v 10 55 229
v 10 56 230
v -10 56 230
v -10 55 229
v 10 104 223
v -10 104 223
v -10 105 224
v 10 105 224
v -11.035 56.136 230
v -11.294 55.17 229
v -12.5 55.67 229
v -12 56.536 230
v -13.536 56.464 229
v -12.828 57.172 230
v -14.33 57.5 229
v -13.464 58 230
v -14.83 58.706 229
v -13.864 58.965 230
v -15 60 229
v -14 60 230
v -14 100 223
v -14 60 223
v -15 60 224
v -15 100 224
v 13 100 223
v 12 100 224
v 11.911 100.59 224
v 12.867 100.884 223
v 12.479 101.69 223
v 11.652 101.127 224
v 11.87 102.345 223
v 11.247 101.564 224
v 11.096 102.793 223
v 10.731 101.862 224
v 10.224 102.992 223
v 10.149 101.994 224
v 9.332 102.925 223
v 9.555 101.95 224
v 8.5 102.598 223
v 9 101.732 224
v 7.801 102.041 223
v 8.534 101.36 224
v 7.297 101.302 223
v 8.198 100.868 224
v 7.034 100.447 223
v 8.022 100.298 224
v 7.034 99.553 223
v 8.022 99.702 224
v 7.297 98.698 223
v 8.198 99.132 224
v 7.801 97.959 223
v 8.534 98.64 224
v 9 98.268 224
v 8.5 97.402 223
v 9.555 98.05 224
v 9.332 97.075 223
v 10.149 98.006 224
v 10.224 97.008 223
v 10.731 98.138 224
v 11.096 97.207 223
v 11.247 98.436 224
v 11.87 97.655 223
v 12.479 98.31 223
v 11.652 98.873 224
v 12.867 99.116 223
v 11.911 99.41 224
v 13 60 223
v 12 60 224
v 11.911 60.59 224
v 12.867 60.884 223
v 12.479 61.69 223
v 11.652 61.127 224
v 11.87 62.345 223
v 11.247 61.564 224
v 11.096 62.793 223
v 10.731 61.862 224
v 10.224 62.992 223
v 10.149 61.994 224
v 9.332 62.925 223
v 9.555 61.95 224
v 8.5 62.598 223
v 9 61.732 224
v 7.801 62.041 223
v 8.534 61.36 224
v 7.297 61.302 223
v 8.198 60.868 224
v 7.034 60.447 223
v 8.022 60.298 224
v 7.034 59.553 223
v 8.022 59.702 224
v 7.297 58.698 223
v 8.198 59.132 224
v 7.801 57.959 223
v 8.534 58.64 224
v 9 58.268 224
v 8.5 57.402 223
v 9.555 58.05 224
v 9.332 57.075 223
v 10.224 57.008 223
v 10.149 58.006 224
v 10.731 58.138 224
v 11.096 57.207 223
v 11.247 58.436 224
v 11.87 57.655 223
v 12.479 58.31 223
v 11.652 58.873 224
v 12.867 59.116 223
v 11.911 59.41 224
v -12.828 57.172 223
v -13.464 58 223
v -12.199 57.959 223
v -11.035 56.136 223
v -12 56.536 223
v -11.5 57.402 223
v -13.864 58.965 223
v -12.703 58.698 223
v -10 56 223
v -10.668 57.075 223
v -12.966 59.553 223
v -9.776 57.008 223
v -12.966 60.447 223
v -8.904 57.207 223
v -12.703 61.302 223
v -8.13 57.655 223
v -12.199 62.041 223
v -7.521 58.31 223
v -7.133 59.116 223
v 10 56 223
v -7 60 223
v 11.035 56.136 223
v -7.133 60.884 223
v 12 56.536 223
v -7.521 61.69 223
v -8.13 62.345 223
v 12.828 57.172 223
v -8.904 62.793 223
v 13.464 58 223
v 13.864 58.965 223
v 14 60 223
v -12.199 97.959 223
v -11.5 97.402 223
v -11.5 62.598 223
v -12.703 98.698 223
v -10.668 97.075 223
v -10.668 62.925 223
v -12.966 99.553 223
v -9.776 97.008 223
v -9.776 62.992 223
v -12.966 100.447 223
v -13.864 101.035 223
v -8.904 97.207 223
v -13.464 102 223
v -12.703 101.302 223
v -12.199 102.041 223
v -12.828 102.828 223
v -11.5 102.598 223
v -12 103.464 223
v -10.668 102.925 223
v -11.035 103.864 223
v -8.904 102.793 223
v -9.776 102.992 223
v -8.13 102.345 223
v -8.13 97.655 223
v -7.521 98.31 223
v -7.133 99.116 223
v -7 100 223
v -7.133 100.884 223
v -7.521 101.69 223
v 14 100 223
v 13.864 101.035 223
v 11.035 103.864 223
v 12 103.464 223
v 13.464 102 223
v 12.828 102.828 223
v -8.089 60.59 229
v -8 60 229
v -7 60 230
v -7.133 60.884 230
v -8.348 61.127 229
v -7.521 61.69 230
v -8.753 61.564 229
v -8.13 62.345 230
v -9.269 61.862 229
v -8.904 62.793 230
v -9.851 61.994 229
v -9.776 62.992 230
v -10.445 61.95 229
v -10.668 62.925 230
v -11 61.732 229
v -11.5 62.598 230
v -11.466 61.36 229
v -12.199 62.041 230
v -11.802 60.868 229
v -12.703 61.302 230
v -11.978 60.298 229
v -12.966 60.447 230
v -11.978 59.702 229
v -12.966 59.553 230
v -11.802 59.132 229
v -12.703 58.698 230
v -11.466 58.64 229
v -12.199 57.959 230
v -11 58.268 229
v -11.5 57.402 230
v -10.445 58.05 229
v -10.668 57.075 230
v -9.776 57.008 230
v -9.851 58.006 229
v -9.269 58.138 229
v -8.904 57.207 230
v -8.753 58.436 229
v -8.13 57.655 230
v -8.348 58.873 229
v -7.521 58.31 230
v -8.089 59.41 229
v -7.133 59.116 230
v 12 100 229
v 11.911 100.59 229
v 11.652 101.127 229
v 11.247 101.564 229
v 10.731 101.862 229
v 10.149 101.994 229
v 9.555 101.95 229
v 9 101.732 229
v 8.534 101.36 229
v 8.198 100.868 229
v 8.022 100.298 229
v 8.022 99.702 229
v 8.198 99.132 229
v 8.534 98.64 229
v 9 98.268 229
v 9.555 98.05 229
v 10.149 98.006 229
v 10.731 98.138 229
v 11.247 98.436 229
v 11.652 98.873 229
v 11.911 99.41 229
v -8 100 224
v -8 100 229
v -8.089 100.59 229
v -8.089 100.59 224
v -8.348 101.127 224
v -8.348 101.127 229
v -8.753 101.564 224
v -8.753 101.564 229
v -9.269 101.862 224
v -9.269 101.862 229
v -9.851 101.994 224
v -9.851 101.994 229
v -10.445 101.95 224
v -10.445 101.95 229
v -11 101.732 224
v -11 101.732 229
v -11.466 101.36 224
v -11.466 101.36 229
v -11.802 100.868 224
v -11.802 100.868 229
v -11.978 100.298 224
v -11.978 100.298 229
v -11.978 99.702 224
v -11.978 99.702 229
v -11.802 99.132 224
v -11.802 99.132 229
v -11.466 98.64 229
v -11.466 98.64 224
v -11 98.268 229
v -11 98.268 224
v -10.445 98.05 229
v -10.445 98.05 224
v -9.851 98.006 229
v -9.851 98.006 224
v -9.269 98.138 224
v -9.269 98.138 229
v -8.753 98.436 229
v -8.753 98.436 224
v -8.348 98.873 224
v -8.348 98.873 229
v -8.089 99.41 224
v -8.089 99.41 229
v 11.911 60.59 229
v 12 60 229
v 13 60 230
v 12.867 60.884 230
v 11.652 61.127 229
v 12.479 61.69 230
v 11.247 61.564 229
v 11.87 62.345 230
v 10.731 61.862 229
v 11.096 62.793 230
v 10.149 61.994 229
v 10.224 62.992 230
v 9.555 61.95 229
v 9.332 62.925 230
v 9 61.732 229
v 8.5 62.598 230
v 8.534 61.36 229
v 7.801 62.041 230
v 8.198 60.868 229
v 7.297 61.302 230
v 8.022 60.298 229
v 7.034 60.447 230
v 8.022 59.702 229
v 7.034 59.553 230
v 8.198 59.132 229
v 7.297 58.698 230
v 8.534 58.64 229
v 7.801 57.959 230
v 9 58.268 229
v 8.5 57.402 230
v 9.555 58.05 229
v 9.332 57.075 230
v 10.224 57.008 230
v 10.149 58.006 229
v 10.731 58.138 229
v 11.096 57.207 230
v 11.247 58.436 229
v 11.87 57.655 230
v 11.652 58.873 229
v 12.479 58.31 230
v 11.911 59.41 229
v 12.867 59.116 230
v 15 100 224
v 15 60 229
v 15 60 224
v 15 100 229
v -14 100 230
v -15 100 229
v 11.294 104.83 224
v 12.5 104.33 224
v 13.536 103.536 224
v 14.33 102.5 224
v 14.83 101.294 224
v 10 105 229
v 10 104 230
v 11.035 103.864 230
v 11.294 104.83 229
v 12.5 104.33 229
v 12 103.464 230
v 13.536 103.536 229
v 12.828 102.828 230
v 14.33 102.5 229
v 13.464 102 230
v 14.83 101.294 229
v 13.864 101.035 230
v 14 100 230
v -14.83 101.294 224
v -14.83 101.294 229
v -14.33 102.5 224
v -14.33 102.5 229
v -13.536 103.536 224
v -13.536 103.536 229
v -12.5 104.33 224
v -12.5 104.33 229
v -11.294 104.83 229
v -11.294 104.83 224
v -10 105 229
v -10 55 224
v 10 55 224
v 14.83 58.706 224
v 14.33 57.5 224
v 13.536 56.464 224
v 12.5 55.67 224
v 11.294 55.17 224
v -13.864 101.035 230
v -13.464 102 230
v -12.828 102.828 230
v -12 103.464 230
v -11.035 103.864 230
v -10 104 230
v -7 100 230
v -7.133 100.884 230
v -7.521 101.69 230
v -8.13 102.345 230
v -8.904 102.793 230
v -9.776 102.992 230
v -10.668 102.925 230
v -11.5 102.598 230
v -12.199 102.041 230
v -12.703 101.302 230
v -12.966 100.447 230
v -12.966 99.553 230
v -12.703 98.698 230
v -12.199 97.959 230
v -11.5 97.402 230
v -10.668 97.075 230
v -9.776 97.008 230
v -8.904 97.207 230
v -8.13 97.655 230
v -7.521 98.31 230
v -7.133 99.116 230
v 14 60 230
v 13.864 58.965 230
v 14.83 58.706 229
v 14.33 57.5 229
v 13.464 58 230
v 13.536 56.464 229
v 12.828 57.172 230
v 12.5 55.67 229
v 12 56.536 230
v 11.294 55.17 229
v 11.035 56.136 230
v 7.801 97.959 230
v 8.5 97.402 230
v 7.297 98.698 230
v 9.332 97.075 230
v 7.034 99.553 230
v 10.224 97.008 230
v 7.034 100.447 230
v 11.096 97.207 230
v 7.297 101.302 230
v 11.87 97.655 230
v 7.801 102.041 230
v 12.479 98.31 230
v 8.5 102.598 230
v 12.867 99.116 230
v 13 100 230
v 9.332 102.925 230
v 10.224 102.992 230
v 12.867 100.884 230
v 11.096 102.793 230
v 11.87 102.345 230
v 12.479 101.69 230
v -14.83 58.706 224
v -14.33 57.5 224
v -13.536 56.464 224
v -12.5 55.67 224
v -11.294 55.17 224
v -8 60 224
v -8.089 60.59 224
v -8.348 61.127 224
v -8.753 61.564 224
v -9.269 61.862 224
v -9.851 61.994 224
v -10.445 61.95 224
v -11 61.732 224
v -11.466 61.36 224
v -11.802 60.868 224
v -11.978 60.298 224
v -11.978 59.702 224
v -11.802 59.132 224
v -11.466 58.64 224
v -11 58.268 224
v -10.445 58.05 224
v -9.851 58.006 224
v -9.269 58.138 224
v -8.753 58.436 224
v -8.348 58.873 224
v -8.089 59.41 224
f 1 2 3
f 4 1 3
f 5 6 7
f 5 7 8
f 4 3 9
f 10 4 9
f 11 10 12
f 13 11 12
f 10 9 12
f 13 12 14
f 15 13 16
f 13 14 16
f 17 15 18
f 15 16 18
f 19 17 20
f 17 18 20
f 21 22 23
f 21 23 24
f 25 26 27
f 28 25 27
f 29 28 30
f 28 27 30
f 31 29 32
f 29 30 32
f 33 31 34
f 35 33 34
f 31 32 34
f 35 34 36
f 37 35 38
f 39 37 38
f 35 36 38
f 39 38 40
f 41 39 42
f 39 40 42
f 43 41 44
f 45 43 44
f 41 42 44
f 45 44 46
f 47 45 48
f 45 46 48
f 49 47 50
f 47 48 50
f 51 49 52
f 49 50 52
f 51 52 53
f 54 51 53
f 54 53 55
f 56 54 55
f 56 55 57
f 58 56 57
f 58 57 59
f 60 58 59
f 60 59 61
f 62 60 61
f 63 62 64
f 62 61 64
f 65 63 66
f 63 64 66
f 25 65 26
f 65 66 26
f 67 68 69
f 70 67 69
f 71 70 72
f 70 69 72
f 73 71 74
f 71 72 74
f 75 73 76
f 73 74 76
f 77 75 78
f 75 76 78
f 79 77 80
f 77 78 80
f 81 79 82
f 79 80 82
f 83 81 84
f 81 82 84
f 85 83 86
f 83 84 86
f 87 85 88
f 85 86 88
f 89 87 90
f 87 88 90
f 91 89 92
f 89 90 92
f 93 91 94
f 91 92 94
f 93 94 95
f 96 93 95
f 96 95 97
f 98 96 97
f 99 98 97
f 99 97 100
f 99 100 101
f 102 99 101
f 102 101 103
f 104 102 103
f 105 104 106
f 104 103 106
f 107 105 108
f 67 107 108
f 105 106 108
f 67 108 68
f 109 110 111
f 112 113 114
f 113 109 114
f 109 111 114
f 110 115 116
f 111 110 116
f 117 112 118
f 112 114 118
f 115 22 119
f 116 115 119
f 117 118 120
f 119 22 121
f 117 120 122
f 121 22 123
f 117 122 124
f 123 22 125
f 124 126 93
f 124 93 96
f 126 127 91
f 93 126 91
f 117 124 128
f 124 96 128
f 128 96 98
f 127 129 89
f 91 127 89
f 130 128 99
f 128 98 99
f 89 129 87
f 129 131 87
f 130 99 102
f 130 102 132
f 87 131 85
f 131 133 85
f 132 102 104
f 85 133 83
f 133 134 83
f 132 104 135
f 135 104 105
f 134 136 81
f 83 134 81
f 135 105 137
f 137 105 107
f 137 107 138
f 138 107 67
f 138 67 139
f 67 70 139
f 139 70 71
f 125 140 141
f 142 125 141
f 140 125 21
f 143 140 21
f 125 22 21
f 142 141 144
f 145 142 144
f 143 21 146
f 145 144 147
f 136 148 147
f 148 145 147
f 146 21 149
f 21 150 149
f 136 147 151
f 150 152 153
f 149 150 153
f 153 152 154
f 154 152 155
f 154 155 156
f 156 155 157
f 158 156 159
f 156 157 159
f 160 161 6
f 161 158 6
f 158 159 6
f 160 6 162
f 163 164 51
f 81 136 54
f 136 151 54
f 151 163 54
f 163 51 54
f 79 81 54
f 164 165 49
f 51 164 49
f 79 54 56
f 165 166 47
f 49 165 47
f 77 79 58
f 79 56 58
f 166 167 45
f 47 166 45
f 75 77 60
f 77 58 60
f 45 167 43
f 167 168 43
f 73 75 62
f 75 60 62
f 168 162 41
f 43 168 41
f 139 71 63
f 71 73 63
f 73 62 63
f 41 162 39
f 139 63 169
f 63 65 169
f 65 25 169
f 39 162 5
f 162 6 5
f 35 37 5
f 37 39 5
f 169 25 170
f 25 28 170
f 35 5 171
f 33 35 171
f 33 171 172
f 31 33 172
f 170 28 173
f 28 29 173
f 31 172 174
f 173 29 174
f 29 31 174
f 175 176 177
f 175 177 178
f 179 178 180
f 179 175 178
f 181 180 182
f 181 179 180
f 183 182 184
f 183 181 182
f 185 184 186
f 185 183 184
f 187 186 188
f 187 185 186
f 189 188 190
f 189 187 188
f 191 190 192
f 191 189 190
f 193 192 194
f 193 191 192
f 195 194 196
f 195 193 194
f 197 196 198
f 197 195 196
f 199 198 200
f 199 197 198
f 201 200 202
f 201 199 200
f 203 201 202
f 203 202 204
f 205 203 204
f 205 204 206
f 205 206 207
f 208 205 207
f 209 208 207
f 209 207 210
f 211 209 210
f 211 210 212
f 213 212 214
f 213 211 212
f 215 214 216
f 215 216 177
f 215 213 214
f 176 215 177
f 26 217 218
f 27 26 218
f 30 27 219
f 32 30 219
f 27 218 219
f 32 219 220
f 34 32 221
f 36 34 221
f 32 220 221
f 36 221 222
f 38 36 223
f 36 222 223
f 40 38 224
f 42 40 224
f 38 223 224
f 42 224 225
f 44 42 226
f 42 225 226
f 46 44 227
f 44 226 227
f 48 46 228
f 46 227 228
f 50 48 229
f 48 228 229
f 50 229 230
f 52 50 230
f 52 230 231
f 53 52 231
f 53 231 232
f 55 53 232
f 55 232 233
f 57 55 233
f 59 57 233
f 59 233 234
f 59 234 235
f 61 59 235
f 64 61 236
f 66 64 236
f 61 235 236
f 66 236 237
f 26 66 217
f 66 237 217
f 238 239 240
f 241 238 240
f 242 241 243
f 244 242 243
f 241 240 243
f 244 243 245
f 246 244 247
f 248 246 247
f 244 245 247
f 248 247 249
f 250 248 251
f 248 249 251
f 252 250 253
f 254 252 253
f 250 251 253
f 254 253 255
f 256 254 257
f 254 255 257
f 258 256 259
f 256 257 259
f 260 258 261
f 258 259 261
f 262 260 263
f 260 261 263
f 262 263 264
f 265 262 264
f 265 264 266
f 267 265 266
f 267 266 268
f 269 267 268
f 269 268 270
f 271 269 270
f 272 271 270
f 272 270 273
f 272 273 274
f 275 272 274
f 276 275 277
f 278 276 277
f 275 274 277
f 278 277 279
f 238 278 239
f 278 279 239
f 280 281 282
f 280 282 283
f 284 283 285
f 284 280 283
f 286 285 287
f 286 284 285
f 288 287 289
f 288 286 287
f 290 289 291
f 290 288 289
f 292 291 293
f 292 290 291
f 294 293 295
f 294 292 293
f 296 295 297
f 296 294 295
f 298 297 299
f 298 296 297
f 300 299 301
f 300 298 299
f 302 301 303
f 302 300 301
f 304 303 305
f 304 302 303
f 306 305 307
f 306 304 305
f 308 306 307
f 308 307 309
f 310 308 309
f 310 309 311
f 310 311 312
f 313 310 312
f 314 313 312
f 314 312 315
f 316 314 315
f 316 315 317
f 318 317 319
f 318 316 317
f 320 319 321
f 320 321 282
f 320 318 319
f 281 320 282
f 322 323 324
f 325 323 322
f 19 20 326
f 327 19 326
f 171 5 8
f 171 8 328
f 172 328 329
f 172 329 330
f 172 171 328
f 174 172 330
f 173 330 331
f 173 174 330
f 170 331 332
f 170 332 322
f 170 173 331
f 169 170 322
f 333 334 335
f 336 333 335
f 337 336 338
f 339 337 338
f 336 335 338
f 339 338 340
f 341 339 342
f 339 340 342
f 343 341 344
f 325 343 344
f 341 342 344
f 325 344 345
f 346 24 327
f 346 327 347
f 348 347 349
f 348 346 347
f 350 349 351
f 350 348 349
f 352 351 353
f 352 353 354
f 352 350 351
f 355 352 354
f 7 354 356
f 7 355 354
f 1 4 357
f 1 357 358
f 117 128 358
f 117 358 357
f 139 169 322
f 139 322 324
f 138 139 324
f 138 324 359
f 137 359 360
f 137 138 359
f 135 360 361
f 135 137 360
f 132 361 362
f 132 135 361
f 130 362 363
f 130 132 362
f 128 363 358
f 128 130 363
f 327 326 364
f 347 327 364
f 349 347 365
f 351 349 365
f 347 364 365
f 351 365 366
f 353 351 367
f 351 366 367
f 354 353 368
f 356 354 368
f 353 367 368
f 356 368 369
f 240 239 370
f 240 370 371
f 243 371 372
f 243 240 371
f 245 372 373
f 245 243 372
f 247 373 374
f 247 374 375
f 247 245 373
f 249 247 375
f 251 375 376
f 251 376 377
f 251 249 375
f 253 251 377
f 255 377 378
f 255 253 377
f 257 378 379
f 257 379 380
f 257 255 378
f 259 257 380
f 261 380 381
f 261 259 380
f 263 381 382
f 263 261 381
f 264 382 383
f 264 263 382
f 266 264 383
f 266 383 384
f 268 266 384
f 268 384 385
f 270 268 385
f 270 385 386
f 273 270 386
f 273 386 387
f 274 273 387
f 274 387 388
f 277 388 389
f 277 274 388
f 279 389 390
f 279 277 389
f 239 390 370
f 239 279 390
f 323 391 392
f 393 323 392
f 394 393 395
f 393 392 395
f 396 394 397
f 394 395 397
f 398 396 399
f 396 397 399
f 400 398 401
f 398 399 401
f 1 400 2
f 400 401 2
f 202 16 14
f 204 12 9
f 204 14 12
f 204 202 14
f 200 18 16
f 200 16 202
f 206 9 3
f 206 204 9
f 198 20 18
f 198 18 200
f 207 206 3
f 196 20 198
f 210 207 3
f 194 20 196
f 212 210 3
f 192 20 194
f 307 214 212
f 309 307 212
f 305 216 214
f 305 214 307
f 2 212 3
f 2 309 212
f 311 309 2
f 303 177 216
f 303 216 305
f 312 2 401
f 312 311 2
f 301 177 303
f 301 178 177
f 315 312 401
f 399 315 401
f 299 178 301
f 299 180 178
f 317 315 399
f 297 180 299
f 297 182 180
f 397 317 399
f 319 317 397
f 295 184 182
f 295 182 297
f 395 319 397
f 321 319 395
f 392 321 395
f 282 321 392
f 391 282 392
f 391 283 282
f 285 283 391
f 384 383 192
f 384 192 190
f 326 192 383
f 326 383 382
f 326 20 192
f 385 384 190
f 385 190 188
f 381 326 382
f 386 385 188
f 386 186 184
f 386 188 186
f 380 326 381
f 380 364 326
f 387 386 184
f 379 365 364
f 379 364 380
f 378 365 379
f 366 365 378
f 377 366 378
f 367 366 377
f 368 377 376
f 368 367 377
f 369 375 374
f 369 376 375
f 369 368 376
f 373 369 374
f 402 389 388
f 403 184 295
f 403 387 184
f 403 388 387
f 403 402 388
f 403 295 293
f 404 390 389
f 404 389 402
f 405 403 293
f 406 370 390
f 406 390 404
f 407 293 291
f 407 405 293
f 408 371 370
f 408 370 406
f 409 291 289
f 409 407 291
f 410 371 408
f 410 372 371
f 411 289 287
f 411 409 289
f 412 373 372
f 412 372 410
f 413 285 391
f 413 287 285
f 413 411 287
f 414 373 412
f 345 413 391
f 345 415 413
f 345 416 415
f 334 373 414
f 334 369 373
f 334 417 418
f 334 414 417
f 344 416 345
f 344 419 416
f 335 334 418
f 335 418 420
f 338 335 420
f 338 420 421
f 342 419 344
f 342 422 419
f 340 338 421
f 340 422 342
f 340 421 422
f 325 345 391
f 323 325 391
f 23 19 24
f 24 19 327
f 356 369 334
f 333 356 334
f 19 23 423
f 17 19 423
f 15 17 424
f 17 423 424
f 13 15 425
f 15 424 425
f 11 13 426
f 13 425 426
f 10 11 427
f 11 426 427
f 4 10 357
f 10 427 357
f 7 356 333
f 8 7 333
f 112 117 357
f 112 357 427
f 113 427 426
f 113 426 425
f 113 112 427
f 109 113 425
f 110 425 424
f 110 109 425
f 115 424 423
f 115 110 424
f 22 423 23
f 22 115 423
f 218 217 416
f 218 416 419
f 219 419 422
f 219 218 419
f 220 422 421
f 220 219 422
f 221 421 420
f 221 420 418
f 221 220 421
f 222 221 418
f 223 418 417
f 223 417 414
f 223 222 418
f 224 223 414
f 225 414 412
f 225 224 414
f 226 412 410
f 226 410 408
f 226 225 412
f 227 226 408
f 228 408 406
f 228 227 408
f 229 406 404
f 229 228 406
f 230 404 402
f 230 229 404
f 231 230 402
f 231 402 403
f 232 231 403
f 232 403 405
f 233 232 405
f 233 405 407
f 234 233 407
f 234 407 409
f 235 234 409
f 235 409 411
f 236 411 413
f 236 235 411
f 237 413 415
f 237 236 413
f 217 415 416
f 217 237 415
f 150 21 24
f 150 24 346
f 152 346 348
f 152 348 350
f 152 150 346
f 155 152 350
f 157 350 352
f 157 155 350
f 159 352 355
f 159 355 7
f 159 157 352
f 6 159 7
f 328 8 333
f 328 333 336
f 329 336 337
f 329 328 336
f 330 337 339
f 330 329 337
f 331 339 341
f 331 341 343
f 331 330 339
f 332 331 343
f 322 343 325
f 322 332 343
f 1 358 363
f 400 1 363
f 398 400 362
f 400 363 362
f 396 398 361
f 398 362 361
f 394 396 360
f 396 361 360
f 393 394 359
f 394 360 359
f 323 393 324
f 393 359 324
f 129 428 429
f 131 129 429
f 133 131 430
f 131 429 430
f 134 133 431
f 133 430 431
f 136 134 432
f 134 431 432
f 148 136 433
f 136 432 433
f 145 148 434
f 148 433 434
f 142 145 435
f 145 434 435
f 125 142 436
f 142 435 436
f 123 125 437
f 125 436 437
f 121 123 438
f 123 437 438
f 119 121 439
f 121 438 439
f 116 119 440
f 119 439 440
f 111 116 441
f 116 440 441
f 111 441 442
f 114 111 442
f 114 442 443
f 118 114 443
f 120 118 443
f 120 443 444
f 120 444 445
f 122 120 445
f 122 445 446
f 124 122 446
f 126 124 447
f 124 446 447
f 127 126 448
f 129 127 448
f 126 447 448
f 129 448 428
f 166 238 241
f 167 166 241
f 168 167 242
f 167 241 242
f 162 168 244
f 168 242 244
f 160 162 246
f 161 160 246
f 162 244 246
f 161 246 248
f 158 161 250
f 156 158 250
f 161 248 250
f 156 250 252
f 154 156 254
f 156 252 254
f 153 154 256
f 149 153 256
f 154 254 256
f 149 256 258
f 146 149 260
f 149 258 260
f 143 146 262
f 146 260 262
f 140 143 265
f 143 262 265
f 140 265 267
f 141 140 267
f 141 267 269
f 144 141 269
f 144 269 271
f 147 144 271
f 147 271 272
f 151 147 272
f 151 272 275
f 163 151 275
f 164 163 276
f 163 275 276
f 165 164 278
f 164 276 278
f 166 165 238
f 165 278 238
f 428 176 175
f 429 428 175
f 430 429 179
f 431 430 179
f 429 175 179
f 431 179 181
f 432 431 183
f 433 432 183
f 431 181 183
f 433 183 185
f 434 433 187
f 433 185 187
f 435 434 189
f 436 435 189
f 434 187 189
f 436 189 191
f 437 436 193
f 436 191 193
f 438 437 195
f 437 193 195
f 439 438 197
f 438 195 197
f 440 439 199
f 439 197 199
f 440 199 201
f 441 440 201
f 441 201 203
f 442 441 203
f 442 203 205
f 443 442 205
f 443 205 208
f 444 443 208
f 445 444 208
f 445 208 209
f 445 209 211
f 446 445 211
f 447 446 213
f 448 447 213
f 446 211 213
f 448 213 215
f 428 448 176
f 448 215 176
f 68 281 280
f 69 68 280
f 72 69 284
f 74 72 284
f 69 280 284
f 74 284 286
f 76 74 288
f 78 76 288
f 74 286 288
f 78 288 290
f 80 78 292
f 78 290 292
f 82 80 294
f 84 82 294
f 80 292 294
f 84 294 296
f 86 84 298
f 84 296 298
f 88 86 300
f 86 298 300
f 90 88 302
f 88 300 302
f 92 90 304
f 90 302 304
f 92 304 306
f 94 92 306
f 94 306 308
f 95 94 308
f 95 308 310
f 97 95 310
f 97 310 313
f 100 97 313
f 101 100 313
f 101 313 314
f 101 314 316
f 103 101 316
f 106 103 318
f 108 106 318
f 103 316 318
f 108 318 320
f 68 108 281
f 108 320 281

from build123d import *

# Parameters (mm, degrees)
SKETCH045_W     = 30
SKETCH045_H     = 50
SKETCH045_R     = 2
PAD020_DEPTH    = 7
FILLET019_R     = 5
CHAMFER032_SIZE = 1


with BuildPart() as part:
    # Sketch045 → Pad020 (new body)
    with BuildSketch(Plane.XY):
        Rectangle(SKETCH045_W, SKETCH045_H)
        with Locations((-10, 20)):
            Circle(SKETCH045_R, mode=Mode.SUBTRACT)
        with Locations((10, 20)):
            Circle(SKETCH045_R, mode=Mode.SUBTRACT)
        with Locations((10, -20)):
            Circle(SKETCH045_R, mode=Mode.SUBTRACT)
        with Locations((-10, -20)):
            Circle(SKETCH045_R, mode=Mode.SUBTRACT)
    extrude(amount=-PAD020_DEPTH)

    # Fillet019
    fillet019_edges = [part.edges().sort_by_distance(p)[0] for p in [
        (15, -25, -3.5),
        (-15, -25, -3.5),
        (-15, 25, -3.5),
        (15, 25, -3.5),
    ]]
    fillet(fillet019_edges, radius=FILLET019_R)

    # Chamfer032
    chamfer032_edges = [part.edges().sort_by_distance(p)[0] for p in [
        (-15, 0, 0),
        (-13.535534, -23.535534, 0),
        (-13.535534, 23.535534, 0),
        (0, -25, 0),
        (0, 25, 0),
        (13.535534, -23.535534, 0),
        (13.535534, 23.535534, 0),
        (15, 0, 0),
        (-12, 20, 0),
        (8, 20, 0),
        (8, -20, 0),
        (-12, -20, 0),
        (-15, 0, -7),
        (-13.535534, -23.535534, -7),
        (-13.535534, 23.535534, -7),
        (0, -25, -7),
        (0, 25, -7),
        (13.535534, -23.535534, -7),
        (13.535534, 23.535534, -7),
        (15, 0, -7),
        (-12, 20, -7),
        (8, 20, -7),
        (8, -20, -7),
        (-12, -20, -7),
    ]]
    chamfer(chamfer032_edges, length=CHAMFER032_SIZE)


with BuildPart() as part_1:
    # Body015 placement: moved
    add(part.part.moved(Location((0, 80, 230))))


solid = part_1.part
